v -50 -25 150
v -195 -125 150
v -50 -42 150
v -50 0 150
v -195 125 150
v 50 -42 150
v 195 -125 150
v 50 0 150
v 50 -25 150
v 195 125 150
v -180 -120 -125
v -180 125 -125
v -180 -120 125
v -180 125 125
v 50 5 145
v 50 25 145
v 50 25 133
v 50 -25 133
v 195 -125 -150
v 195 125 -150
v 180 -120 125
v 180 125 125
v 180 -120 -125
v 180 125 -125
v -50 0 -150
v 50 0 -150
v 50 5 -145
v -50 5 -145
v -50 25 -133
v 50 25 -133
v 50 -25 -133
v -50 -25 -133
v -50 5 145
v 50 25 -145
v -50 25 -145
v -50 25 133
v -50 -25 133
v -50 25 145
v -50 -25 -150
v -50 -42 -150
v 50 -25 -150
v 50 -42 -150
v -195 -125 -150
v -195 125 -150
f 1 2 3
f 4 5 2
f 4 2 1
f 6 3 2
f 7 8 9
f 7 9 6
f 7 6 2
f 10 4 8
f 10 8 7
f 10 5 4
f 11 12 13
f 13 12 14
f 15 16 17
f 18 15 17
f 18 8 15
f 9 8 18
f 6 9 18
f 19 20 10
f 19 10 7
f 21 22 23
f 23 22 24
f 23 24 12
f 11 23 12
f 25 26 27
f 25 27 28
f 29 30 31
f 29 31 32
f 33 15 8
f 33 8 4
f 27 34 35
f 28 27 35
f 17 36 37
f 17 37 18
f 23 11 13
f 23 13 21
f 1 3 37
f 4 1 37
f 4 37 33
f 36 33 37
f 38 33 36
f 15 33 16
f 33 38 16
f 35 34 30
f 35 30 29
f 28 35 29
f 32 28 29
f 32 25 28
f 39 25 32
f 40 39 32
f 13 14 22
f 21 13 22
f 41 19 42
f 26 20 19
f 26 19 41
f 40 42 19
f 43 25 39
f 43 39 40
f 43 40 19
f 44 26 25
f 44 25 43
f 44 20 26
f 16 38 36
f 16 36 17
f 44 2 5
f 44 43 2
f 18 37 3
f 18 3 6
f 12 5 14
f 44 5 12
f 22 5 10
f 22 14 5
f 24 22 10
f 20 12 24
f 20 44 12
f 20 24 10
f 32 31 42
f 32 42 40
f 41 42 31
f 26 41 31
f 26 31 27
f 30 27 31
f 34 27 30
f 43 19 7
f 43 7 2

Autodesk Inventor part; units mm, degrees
ref_plane "YZ Plane" through (0, 0, 0) normal (1, 0, 0) x (0, 1, 0)
ref_plane "XZ Plane" through (0, 0, 0) normal (0, 1, 0) x (-1, 0, 0)
ref_plane "XY Plane" through (0, 0, 0) normal (0, 0, 1) x (1, 0, 0)
sketch "草图1" plane through (0, 0, 0) normal (0, 0, 1) x (1, 0, 0)
  line L0 (-195, 125) -> (195, 125)
  line L1 (195, 125) -> (195, -125)
  line L2 (195, -125) -> (-195, -125)
  line L3 (-195, -125) -> (-195, 125)
  line L4 (0, -175) -> (0, 175) projected
  line L5 (-273, 0) -> (273, 0) projected
  point P0 (0, 0)
  dimension "d0" = 250
  dimension "d1" = 390
extrude "拉伸1" add sketch "草图1" along normal mid plane 300
sketch "草图2" plane through (-195, 125, 150) normal (0, 1, 0) x (1, 0, 0)
  line L0 (15, 25) -> (375, 25)
  line L1 (375, 25) -> (375, 275)
  line L2 (375, 275) -> (15, 275)
  line L3 (15, 275) -> (15, 25)
  line L4 (-78, 150) -> (468, 150) projected
  line L5 (195, 360) -> (195, -60) projected
  point P0 (195, 150)
  dimension "d4" = 360
  dimension "d5" = 250
extrude "拉伸2" cut sketch "草图2" against normal blind 245
sketch "草图3" plane through (0, 0, 150) normal (0, 0, 1) x (1, 0, 0)
  line L0 (-50, 25) -> (50, 25)
  line L1 (50, 25) -> (50, -25)
  line L2 (50, -25) -> (-50, -25)
  line L3 (-50, -25) -> (-50, 25)
  line L4 (-273, 0) -> (273, 0) projected
  line L5 (0, -175) -> (0, 175) projected
  point P0 (0, 0)
  dimension "d8" = 100
  dimension "d9" = 50
extrude "拉伸3" cut sketch "草图3" against normal blind 17
sketch "草图4" plane through (0, 0, 150) normal (0, 0, 1) x (1, 0, 0)
  line L0 (-50, -25) -> (-50, 25) projected
  line L1 (50, 25) -> (50, -25) projected
  line L2 (-50, 25) -> (50, 25)
  line L3 (50, 25) -> (50, 0)
  line L4 (50, 0) -> (-50, 0)
  line L5 (-50, 0) -> (-50, 25)
  point P0 (0, 0)
extrude "拉伸4" add sketch "草图4" against normal blind 5
mirror "镜像1" about plane through (0, 0, 0) normal (0, 0, 1) of "拉伸3", "拉伸4"
chamfer "倒角1" distance 17 angle 45 2 edges at (0, -25, 150) (0, -25, -150)
chamfer "倒角2" distance 5 angle 45 2 edges at (0, 0, 145) (0, 0, -145)
properties part number "容器"
